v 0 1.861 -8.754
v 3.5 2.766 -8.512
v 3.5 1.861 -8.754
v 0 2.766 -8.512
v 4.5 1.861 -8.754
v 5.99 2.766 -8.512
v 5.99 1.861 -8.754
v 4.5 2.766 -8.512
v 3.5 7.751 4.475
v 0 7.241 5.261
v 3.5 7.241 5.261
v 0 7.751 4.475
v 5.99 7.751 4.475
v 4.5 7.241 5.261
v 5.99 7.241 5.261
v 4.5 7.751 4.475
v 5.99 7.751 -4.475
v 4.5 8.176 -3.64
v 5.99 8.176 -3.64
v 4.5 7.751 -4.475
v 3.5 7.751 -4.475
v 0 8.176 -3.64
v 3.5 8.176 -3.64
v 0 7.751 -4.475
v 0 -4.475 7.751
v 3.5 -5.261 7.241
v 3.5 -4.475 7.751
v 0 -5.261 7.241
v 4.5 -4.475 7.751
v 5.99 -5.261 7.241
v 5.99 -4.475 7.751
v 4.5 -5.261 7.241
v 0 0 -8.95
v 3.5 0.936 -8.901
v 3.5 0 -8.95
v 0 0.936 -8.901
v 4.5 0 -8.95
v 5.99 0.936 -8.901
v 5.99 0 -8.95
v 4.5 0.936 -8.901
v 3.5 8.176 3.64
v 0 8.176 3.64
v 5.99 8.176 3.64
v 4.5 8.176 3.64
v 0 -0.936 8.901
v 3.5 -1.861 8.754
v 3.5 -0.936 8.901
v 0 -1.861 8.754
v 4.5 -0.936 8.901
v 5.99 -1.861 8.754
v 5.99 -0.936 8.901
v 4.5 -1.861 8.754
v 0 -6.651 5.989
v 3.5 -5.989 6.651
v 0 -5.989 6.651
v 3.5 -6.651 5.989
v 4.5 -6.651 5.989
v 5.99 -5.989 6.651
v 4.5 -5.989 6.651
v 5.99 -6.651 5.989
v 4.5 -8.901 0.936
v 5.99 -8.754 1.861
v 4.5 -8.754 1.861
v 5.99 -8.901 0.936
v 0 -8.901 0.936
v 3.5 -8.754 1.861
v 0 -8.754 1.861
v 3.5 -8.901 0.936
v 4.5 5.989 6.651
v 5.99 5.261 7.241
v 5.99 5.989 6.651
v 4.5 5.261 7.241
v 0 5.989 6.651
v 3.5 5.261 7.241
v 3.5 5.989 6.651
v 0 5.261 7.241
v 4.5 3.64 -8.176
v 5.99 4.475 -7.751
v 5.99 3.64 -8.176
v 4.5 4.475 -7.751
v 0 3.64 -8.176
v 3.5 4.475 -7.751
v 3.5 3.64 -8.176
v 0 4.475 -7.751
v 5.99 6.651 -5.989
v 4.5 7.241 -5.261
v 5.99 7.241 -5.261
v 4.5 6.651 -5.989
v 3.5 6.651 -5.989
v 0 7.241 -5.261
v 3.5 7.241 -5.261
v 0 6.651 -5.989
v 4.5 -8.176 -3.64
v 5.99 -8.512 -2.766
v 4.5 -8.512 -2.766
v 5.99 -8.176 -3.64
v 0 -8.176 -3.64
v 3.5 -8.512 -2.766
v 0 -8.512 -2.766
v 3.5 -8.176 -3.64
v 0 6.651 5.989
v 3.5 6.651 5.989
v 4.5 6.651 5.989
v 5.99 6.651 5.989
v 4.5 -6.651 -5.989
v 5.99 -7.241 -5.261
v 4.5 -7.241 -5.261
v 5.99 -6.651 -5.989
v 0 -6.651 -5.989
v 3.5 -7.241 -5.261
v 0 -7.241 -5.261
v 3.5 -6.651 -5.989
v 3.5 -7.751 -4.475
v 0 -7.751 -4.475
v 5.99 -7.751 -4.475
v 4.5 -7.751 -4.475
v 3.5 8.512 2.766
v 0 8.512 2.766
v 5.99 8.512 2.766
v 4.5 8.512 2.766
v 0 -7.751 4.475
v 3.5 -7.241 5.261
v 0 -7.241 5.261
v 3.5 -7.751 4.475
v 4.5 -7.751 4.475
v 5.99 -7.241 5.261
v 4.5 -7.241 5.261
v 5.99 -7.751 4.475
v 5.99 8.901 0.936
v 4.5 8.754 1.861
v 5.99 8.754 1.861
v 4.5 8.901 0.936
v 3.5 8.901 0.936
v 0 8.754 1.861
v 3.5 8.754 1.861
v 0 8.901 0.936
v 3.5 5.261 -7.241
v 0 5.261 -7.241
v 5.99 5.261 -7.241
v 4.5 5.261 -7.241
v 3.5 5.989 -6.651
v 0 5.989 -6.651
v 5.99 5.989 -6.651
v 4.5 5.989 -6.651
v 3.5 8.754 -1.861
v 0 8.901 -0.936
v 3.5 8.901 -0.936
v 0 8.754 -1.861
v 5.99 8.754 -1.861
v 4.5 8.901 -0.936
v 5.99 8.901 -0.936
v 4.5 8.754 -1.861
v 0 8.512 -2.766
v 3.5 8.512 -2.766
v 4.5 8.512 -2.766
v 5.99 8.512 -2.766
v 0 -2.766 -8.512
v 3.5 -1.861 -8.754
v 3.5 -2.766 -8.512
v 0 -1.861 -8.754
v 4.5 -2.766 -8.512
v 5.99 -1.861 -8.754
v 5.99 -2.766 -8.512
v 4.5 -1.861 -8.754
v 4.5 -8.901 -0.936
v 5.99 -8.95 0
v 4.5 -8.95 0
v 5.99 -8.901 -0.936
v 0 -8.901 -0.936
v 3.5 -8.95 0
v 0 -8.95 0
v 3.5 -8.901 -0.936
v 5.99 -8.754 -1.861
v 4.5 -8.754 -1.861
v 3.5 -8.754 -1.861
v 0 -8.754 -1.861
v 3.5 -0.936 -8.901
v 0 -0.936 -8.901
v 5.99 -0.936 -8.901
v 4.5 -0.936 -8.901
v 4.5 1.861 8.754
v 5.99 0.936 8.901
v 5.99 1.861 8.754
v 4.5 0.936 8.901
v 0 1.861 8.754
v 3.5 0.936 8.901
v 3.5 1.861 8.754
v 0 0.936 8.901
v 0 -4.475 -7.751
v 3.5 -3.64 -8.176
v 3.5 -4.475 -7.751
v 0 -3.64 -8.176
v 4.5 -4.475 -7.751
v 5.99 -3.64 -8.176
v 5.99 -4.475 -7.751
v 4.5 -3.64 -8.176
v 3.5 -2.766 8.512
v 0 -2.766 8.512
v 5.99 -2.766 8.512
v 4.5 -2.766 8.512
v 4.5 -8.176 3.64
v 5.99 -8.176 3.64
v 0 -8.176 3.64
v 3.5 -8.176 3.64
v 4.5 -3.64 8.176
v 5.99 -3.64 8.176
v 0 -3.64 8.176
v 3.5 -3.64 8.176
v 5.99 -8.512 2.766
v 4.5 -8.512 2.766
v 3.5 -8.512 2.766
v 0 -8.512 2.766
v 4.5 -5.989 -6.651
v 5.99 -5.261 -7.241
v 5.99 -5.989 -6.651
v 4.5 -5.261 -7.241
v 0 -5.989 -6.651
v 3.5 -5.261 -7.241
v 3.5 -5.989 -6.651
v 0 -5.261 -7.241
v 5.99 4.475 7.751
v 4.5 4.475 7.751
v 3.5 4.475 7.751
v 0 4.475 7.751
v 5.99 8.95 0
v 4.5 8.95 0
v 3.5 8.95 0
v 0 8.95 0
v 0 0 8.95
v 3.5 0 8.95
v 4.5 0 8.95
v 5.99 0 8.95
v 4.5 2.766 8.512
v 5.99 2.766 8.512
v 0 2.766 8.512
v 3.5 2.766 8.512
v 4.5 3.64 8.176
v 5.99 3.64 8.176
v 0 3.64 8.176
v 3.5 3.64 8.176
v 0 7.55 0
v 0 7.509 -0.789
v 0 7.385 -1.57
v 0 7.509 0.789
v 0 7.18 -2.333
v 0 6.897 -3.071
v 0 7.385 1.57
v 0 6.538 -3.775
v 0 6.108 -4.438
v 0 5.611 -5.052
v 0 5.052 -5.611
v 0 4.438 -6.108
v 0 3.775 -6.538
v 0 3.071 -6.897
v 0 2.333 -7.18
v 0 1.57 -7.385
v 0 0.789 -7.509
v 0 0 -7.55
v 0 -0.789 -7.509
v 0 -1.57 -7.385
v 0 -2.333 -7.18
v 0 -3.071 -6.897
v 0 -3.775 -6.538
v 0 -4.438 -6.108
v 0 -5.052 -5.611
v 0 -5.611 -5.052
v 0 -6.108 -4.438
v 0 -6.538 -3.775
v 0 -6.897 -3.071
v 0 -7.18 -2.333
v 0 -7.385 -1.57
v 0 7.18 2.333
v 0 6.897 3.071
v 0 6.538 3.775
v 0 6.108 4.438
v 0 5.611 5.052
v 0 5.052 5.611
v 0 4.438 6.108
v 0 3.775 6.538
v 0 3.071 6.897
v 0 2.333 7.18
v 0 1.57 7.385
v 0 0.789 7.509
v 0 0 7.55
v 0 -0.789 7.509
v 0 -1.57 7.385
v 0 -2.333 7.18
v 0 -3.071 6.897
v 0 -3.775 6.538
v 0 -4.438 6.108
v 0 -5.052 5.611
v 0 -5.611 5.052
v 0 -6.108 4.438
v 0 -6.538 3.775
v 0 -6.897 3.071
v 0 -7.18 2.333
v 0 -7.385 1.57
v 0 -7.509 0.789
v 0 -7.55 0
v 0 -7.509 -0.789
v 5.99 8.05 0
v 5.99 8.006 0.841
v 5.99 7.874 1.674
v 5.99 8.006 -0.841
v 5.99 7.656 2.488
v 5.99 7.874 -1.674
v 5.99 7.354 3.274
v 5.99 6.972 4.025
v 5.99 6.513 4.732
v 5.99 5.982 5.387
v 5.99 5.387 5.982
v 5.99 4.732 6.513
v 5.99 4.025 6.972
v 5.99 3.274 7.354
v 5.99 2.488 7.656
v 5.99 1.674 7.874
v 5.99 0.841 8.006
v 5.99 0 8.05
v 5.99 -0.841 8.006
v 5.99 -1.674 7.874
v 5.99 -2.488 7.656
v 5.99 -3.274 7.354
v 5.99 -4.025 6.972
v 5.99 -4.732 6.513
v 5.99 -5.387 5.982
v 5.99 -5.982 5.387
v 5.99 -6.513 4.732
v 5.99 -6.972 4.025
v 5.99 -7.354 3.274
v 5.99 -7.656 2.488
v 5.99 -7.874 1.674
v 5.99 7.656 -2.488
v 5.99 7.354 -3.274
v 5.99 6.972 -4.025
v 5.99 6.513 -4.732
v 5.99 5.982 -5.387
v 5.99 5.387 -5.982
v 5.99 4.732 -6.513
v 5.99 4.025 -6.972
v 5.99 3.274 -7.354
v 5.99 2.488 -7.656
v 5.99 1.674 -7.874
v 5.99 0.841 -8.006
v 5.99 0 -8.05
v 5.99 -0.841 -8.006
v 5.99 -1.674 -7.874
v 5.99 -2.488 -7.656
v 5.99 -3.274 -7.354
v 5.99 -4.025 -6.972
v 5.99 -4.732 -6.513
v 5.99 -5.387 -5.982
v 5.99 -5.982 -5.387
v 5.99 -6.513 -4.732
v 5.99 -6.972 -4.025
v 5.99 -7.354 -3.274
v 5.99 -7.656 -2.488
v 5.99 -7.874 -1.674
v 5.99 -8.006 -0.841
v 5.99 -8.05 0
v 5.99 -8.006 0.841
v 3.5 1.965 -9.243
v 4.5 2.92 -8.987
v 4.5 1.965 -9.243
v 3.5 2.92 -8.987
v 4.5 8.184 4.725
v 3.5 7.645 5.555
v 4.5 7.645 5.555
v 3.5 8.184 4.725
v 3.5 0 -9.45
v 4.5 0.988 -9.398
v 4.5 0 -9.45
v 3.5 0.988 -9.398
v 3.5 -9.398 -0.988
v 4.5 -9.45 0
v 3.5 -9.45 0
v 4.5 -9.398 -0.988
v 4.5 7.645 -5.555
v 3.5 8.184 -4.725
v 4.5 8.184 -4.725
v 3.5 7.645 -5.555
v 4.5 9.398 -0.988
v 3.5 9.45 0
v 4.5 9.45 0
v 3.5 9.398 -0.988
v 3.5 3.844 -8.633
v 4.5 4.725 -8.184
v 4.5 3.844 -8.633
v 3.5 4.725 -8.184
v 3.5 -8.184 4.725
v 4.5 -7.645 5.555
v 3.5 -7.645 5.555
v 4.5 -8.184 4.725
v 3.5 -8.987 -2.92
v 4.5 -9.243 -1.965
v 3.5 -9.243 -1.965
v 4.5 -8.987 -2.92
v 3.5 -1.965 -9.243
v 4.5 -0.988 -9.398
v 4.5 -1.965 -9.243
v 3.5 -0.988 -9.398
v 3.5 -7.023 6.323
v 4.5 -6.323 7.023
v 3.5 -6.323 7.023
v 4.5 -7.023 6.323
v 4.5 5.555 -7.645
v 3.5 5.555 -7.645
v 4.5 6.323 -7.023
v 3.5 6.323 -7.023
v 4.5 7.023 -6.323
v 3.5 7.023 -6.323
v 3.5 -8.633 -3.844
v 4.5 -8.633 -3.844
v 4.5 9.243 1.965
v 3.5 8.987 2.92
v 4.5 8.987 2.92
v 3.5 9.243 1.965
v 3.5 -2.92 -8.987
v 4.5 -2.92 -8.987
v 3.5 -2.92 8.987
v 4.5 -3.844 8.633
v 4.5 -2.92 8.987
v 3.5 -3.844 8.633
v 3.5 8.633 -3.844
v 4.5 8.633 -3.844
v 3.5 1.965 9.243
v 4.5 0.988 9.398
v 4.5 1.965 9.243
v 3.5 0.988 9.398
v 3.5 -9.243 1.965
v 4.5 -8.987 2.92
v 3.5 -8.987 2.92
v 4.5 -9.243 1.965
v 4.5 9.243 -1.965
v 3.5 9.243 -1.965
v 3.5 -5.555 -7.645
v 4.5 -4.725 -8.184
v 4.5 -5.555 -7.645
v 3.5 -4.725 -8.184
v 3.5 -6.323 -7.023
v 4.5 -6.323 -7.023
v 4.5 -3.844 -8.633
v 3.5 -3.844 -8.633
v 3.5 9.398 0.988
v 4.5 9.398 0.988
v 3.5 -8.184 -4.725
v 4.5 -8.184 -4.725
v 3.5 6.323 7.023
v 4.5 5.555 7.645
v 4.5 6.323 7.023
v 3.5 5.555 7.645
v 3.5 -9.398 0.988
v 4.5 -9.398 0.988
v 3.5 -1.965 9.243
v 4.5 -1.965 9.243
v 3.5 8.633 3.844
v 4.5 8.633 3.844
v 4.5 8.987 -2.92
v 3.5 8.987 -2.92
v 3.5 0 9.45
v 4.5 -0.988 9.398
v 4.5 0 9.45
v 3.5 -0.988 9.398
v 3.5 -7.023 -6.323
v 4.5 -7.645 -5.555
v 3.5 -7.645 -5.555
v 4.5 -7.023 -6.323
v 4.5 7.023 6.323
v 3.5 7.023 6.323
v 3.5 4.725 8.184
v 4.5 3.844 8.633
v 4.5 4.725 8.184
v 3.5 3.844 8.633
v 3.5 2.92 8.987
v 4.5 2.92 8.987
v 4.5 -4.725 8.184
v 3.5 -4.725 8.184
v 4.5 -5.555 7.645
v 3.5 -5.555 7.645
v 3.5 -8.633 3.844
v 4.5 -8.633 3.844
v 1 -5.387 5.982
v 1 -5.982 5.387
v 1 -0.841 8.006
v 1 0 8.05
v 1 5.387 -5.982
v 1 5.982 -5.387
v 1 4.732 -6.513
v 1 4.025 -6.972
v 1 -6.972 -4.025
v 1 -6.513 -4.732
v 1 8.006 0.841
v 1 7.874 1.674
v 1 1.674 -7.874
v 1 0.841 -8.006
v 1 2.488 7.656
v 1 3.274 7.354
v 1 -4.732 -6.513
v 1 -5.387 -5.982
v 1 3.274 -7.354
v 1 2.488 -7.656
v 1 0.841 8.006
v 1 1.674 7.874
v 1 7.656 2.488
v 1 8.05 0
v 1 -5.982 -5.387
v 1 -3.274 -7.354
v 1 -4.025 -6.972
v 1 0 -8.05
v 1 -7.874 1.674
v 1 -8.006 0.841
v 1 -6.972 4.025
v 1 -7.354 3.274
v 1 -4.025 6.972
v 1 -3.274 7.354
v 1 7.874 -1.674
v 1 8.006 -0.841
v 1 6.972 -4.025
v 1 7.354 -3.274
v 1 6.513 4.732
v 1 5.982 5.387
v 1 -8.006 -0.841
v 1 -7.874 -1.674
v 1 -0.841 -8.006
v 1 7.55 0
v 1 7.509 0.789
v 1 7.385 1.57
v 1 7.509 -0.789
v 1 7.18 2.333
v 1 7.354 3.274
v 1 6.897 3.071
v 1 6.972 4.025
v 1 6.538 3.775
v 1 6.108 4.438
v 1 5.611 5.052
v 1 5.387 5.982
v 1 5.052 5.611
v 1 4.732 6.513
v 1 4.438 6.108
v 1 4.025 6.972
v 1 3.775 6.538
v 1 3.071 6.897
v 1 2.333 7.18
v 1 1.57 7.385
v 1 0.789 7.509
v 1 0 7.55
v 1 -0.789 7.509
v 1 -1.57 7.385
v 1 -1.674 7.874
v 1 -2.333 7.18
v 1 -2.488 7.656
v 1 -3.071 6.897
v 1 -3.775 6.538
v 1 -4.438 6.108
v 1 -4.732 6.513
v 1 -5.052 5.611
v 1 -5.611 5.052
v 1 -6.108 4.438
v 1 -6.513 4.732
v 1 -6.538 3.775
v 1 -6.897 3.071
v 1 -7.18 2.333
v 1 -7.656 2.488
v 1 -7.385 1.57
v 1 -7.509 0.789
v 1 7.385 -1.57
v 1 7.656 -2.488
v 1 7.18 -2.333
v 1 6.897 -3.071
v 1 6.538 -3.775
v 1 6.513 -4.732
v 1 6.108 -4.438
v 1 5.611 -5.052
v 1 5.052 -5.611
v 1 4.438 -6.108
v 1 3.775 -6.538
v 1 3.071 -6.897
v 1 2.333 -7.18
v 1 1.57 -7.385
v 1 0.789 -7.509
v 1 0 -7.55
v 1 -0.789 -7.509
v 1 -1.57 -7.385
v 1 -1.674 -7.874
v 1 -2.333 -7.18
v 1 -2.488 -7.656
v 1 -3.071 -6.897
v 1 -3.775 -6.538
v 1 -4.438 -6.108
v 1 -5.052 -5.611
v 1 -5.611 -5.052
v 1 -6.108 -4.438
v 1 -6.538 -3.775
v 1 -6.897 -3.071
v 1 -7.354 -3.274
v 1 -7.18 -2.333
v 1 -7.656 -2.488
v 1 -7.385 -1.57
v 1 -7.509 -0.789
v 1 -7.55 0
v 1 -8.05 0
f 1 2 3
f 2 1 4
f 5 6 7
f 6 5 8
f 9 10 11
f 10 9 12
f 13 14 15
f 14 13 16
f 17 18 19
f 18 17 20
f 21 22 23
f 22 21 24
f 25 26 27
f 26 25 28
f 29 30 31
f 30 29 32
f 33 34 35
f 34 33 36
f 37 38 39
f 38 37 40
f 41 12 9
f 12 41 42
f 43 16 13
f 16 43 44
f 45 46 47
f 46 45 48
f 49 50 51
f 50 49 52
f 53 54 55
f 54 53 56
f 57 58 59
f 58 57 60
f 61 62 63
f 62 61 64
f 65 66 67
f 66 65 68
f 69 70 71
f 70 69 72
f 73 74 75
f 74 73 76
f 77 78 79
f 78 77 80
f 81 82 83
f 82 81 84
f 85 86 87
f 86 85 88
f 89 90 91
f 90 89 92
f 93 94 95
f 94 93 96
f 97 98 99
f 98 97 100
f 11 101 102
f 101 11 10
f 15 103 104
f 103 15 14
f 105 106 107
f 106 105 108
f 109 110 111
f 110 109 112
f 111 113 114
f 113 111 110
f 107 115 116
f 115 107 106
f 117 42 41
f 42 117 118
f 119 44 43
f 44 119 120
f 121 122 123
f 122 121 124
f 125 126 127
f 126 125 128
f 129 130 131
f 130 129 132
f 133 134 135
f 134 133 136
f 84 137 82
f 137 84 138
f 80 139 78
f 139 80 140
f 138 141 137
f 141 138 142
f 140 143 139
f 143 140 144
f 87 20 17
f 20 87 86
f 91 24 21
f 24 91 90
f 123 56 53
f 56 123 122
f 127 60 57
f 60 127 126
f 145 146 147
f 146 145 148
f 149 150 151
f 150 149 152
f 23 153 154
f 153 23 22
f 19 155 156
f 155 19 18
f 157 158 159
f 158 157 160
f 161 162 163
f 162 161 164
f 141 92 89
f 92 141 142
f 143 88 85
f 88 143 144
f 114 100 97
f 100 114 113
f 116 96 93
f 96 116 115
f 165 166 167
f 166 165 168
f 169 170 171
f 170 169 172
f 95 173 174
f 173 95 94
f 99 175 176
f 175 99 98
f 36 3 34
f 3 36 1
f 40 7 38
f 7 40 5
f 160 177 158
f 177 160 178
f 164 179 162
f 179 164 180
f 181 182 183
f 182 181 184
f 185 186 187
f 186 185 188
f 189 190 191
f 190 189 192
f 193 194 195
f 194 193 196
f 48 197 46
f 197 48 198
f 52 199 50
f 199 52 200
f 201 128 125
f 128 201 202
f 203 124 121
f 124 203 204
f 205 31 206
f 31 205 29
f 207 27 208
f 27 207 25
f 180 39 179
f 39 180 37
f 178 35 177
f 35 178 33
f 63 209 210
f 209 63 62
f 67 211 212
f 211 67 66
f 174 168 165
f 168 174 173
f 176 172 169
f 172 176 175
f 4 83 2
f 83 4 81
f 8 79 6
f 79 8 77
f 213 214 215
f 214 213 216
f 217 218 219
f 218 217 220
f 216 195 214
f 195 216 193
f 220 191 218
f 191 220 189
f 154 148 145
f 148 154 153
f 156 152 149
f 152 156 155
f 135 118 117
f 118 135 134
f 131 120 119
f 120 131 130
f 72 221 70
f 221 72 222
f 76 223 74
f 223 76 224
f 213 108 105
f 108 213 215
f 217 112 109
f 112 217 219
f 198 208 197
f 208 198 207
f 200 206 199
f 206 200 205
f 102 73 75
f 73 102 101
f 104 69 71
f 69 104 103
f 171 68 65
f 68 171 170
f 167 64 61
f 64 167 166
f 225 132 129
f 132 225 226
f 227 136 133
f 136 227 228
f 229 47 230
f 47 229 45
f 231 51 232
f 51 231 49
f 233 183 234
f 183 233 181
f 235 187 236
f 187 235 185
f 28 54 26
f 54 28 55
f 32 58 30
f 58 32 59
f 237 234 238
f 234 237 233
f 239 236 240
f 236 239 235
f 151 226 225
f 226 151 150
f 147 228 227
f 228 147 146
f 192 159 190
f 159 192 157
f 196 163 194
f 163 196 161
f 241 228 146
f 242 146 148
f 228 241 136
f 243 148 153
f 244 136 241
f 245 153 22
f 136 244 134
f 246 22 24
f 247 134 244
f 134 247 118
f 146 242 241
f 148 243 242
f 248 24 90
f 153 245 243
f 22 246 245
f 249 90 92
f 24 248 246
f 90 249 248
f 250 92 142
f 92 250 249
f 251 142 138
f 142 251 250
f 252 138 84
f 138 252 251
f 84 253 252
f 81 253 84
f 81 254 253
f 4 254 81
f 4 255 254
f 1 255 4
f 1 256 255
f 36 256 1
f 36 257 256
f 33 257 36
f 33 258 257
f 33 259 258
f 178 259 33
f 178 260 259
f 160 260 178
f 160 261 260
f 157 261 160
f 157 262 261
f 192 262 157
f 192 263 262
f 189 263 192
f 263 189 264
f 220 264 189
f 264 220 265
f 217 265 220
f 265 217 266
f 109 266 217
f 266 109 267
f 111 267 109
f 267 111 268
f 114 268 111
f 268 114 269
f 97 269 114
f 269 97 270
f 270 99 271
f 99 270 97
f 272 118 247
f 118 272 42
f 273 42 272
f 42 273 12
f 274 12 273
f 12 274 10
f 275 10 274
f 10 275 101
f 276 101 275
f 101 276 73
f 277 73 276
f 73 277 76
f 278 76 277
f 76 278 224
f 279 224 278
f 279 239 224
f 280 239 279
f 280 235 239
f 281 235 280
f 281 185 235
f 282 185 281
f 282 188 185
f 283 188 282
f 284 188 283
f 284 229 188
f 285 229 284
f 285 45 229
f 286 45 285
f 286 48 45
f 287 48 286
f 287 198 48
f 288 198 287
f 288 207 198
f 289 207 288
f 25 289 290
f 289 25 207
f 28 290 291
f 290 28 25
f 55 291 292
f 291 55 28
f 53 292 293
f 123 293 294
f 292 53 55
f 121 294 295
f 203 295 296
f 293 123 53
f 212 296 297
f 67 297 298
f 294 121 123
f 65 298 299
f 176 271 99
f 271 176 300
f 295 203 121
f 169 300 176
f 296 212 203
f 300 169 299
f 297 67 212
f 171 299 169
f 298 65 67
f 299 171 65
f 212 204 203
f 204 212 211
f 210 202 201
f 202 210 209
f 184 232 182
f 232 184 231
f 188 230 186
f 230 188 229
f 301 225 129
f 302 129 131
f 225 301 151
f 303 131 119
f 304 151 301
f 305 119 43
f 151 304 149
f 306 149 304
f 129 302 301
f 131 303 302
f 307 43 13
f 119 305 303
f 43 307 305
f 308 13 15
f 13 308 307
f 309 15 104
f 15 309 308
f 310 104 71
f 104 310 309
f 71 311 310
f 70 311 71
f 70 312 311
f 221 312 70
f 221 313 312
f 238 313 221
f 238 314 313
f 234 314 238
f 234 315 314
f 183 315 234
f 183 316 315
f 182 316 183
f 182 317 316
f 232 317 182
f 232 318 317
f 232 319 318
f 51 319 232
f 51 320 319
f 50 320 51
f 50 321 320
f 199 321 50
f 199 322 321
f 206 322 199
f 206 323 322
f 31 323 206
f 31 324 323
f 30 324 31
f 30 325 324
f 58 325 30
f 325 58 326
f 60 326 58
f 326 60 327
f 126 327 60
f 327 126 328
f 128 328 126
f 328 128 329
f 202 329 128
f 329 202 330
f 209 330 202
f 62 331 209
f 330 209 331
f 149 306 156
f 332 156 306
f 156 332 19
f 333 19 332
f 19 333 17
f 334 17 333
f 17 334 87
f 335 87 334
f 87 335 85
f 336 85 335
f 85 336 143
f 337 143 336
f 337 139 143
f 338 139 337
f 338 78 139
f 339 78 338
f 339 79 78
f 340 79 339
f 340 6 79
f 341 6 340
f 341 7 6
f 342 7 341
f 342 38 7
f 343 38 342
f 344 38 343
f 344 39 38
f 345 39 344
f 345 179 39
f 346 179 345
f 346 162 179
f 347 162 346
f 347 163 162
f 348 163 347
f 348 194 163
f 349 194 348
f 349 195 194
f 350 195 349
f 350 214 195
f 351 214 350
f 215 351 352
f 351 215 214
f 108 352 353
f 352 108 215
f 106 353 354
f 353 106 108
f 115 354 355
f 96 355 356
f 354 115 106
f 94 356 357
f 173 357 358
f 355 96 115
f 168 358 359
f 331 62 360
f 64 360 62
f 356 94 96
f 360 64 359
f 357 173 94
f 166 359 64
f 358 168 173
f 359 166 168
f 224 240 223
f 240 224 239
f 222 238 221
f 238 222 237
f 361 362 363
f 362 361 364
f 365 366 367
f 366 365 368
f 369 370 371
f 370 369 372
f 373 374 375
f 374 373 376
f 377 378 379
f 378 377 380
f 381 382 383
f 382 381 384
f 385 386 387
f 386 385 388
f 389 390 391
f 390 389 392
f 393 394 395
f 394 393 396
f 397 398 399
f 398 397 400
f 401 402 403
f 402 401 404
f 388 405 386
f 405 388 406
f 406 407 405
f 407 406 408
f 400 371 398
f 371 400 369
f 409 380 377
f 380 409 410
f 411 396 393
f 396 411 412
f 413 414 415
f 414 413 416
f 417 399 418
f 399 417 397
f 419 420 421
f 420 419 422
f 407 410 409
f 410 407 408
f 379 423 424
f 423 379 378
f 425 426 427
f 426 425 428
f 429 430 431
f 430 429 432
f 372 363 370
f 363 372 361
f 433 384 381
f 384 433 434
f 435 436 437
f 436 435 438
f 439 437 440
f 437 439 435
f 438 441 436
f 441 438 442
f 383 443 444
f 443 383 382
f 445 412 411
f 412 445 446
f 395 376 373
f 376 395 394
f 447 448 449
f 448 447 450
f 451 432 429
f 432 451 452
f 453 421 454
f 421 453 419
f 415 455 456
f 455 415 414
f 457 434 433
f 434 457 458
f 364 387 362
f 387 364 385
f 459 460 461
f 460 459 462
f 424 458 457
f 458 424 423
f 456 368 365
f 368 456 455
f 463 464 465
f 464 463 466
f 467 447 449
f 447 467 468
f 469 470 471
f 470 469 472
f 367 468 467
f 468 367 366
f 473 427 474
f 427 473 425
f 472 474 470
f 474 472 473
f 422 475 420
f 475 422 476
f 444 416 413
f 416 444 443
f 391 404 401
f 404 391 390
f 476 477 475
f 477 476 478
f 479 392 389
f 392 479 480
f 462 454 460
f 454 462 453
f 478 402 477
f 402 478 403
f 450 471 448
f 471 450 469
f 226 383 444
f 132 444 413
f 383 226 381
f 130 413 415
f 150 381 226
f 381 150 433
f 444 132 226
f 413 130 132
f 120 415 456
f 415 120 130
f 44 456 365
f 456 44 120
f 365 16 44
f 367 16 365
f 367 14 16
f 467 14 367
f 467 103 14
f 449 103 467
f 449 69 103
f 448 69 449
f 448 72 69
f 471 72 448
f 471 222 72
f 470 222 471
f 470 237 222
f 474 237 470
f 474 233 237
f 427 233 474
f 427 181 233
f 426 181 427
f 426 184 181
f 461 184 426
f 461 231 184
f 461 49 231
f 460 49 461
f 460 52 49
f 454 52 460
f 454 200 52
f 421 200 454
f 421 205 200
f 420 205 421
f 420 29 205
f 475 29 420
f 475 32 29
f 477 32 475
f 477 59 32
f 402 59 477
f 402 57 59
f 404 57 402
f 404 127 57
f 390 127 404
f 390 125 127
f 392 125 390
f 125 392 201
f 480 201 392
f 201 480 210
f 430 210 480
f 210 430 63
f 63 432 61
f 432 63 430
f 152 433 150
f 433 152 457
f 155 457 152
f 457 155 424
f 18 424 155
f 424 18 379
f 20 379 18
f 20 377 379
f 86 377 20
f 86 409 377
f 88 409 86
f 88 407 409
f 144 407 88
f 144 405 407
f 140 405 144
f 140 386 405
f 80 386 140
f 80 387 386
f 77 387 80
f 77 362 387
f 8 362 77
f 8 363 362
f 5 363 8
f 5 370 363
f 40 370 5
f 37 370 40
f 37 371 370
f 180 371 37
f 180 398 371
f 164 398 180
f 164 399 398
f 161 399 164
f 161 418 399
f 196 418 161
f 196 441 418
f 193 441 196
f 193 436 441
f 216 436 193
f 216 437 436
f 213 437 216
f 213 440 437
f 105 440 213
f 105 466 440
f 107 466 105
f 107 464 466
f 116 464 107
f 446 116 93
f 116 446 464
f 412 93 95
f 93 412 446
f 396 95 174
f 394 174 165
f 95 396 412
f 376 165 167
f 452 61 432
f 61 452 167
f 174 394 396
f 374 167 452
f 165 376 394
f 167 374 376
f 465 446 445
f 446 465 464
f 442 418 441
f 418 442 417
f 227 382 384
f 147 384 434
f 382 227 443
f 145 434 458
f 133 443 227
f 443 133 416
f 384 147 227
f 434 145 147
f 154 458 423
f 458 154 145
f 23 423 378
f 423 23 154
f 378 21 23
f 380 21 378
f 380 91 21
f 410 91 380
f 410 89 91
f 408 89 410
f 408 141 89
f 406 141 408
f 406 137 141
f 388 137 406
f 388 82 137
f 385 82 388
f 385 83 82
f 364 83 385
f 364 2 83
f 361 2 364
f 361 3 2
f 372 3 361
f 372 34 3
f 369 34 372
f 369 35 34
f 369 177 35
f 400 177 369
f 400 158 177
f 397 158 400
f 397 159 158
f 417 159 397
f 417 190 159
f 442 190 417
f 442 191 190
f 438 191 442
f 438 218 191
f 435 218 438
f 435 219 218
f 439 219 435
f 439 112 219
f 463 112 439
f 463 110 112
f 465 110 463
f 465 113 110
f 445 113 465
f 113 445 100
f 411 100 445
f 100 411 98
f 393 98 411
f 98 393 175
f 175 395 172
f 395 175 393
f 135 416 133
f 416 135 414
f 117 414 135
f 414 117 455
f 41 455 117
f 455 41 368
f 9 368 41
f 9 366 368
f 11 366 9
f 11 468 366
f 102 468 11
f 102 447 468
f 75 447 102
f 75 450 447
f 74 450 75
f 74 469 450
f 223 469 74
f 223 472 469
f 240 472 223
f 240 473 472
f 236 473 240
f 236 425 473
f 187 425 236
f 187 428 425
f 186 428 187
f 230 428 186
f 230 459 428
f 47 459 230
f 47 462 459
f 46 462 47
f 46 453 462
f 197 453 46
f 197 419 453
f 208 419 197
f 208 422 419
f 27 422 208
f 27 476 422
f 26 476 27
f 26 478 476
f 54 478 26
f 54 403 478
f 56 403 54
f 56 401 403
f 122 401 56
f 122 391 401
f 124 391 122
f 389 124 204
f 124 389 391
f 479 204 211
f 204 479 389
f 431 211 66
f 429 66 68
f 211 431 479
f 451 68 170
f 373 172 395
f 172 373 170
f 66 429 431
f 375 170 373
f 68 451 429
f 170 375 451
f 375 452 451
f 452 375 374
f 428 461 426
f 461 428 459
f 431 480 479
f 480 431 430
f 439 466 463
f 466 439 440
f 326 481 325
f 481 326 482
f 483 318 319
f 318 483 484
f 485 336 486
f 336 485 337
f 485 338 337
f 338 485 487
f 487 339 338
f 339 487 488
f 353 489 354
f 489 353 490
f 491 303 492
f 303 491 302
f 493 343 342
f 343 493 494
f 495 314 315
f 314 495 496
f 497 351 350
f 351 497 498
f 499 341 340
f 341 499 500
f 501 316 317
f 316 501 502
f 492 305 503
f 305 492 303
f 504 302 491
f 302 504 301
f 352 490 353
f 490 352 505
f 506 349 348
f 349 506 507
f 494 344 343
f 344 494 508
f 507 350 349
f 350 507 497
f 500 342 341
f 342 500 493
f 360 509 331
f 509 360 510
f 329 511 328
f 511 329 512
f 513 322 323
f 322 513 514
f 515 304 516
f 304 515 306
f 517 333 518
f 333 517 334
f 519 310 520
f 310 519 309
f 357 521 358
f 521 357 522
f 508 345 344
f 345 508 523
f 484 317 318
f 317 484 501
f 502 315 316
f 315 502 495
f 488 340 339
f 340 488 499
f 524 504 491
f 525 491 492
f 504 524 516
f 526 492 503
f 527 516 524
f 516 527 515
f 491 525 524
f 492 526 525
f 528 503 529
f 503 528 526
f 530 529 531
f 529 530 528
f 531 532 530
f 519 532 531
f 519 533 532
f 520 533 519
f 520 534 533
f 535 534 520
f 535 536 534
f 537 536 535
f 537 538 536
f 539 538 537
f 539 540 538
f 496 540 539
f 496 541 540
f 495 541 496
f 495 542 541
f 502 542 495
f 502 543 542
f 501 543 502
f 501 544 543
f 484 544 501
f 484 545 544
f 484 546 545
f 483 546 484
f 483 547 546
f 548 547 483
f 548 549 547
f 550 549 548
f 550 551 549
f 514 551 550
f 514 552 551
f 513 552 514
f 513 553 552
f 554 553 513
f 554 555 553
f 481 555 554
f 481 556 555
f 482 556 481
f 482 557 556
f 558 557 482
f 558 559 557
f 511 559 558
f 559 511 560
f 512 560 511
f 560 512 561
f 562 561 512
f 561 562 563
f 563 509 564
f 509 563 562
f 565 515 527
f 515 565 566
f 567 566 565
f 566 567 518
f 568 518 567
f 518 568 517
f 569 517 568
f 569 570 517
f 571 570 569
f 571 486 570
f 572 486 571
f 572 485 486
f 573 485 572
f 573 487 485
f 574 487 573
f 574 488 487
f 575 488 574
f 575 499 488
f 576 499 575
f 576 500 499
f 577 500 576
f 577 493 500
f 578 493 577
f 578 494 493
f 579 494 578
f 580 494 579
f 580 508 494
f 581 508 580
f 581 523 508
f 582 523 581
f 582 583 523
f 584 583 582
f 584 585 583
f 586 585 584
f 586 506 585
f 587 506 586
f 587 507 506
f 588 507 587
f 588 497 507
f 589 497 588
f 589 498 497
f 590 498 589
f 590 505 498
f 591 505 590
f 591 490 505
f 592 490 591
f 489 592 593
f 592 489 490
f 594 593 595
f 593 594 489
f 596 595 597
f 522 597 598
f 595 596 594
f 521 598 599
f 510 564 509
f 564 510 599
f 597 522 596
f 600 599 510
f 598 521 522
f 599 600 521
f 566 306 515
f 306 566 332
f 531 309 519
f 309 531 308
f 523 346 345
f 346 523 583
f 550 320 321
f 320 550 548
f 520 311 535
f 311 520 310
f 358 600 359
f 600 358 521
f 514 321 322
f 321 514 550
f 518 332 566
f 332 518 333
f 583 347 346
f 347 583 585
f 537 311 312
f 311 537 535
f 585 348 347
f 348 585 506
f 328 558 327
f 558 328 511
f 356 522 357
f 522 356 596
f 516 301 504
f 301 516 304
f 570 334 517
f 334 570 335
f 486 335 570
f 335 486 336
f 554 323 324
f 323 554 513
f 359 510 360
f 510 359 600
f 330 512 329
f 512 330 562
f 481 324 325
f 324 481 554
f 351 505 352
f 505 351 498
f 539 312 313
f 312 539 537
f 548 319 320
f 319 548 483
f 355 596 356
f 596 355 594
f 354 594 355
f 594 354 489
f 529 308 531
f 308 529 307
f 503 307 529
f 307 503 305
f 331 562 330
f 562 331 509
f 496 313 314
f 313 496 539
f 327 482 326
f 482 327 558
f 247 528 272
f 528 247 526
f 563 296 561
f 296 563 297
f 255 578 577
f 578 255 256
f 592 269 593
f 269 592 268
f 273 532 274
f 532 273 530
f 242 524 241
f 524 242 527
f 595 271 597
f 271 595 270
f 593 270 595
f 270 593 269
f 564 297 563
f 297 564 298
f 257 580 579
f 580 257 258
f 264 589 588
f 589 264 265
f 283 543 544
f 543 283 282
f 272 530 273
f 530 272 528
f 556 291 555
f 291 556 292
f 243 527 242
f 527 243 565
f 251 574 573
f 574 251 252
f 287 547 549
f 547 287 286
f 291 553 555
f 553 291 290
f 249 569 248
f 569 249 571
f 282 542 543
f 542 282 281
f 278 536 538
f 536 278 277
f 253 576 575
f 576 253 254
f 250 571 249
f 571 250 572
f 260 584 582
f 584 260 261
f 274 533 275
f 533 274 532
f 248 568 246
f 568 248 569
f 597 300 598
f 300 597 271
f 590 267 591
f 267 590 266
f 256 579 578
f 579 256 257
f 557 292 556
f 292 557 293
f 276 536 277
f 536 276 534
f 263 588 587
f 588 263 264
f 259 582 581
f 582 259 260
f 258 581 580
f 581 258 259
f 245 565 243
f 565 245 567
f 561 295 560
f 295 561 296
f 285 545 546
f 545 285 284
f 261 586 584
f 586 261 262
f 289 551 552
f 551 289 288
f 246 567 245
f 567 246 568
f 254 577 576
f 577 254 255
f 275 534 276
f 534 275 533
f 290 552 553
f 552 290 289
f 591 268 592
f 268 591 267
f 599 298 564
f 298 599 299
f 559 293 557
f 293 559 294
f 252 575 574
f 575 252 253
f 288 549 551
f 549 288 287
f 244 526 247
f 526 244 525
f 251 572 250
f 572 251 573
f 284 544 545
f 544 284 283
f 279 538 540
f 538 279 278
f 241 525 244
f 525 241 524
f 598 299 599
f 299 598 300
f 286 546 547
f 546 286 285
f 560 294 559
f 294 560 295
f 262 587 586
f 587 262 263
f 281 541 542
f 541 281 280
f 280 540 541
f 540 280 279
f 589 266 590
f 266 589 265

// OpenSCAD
$fn=60;
roulement_diamext = 16.1;
roulement_diamint =  6;
roulement_epaisseur= 5;

plaque_diamint    = 17.9;
plaque_epaisseur  =  3;


module roulement() {
    rotate([0,90,0])
    cylinder(d=roulement_diamext, 
             h=roulement_epaisseur);
}
module plaque() {
    difference(){
        translate([0.01,-15,-15])
        cube([plaque_epaisseur,30,30]);

        rotate([0,90,0])
        cylinder(d=plaque_diamint, 
                 h=plaque_epaisseur+0.1);
    }
}

module support() {
    difference() {
        union() {
            rotate([0,90,0])
            cylinder(d=plaque_diamint, 
                     h=roulement_epaisseur+0.99);
            translate([plaque_epaisseur+0.5,0,0])
            rotate([0,90,0])
            cylinder(d=plaque_diamint+1, 
                     h=1);
        }

        translate([1,0,0])
        roulement();
        translate([-0.01,0,0])
        rotate([0,90,0])
        cylinder(d=roulement_diamext-1, 
                 h=1.1);
    }
}



support();
/*
#plaque();
translate([1,0,0])
#roulement();
*/
